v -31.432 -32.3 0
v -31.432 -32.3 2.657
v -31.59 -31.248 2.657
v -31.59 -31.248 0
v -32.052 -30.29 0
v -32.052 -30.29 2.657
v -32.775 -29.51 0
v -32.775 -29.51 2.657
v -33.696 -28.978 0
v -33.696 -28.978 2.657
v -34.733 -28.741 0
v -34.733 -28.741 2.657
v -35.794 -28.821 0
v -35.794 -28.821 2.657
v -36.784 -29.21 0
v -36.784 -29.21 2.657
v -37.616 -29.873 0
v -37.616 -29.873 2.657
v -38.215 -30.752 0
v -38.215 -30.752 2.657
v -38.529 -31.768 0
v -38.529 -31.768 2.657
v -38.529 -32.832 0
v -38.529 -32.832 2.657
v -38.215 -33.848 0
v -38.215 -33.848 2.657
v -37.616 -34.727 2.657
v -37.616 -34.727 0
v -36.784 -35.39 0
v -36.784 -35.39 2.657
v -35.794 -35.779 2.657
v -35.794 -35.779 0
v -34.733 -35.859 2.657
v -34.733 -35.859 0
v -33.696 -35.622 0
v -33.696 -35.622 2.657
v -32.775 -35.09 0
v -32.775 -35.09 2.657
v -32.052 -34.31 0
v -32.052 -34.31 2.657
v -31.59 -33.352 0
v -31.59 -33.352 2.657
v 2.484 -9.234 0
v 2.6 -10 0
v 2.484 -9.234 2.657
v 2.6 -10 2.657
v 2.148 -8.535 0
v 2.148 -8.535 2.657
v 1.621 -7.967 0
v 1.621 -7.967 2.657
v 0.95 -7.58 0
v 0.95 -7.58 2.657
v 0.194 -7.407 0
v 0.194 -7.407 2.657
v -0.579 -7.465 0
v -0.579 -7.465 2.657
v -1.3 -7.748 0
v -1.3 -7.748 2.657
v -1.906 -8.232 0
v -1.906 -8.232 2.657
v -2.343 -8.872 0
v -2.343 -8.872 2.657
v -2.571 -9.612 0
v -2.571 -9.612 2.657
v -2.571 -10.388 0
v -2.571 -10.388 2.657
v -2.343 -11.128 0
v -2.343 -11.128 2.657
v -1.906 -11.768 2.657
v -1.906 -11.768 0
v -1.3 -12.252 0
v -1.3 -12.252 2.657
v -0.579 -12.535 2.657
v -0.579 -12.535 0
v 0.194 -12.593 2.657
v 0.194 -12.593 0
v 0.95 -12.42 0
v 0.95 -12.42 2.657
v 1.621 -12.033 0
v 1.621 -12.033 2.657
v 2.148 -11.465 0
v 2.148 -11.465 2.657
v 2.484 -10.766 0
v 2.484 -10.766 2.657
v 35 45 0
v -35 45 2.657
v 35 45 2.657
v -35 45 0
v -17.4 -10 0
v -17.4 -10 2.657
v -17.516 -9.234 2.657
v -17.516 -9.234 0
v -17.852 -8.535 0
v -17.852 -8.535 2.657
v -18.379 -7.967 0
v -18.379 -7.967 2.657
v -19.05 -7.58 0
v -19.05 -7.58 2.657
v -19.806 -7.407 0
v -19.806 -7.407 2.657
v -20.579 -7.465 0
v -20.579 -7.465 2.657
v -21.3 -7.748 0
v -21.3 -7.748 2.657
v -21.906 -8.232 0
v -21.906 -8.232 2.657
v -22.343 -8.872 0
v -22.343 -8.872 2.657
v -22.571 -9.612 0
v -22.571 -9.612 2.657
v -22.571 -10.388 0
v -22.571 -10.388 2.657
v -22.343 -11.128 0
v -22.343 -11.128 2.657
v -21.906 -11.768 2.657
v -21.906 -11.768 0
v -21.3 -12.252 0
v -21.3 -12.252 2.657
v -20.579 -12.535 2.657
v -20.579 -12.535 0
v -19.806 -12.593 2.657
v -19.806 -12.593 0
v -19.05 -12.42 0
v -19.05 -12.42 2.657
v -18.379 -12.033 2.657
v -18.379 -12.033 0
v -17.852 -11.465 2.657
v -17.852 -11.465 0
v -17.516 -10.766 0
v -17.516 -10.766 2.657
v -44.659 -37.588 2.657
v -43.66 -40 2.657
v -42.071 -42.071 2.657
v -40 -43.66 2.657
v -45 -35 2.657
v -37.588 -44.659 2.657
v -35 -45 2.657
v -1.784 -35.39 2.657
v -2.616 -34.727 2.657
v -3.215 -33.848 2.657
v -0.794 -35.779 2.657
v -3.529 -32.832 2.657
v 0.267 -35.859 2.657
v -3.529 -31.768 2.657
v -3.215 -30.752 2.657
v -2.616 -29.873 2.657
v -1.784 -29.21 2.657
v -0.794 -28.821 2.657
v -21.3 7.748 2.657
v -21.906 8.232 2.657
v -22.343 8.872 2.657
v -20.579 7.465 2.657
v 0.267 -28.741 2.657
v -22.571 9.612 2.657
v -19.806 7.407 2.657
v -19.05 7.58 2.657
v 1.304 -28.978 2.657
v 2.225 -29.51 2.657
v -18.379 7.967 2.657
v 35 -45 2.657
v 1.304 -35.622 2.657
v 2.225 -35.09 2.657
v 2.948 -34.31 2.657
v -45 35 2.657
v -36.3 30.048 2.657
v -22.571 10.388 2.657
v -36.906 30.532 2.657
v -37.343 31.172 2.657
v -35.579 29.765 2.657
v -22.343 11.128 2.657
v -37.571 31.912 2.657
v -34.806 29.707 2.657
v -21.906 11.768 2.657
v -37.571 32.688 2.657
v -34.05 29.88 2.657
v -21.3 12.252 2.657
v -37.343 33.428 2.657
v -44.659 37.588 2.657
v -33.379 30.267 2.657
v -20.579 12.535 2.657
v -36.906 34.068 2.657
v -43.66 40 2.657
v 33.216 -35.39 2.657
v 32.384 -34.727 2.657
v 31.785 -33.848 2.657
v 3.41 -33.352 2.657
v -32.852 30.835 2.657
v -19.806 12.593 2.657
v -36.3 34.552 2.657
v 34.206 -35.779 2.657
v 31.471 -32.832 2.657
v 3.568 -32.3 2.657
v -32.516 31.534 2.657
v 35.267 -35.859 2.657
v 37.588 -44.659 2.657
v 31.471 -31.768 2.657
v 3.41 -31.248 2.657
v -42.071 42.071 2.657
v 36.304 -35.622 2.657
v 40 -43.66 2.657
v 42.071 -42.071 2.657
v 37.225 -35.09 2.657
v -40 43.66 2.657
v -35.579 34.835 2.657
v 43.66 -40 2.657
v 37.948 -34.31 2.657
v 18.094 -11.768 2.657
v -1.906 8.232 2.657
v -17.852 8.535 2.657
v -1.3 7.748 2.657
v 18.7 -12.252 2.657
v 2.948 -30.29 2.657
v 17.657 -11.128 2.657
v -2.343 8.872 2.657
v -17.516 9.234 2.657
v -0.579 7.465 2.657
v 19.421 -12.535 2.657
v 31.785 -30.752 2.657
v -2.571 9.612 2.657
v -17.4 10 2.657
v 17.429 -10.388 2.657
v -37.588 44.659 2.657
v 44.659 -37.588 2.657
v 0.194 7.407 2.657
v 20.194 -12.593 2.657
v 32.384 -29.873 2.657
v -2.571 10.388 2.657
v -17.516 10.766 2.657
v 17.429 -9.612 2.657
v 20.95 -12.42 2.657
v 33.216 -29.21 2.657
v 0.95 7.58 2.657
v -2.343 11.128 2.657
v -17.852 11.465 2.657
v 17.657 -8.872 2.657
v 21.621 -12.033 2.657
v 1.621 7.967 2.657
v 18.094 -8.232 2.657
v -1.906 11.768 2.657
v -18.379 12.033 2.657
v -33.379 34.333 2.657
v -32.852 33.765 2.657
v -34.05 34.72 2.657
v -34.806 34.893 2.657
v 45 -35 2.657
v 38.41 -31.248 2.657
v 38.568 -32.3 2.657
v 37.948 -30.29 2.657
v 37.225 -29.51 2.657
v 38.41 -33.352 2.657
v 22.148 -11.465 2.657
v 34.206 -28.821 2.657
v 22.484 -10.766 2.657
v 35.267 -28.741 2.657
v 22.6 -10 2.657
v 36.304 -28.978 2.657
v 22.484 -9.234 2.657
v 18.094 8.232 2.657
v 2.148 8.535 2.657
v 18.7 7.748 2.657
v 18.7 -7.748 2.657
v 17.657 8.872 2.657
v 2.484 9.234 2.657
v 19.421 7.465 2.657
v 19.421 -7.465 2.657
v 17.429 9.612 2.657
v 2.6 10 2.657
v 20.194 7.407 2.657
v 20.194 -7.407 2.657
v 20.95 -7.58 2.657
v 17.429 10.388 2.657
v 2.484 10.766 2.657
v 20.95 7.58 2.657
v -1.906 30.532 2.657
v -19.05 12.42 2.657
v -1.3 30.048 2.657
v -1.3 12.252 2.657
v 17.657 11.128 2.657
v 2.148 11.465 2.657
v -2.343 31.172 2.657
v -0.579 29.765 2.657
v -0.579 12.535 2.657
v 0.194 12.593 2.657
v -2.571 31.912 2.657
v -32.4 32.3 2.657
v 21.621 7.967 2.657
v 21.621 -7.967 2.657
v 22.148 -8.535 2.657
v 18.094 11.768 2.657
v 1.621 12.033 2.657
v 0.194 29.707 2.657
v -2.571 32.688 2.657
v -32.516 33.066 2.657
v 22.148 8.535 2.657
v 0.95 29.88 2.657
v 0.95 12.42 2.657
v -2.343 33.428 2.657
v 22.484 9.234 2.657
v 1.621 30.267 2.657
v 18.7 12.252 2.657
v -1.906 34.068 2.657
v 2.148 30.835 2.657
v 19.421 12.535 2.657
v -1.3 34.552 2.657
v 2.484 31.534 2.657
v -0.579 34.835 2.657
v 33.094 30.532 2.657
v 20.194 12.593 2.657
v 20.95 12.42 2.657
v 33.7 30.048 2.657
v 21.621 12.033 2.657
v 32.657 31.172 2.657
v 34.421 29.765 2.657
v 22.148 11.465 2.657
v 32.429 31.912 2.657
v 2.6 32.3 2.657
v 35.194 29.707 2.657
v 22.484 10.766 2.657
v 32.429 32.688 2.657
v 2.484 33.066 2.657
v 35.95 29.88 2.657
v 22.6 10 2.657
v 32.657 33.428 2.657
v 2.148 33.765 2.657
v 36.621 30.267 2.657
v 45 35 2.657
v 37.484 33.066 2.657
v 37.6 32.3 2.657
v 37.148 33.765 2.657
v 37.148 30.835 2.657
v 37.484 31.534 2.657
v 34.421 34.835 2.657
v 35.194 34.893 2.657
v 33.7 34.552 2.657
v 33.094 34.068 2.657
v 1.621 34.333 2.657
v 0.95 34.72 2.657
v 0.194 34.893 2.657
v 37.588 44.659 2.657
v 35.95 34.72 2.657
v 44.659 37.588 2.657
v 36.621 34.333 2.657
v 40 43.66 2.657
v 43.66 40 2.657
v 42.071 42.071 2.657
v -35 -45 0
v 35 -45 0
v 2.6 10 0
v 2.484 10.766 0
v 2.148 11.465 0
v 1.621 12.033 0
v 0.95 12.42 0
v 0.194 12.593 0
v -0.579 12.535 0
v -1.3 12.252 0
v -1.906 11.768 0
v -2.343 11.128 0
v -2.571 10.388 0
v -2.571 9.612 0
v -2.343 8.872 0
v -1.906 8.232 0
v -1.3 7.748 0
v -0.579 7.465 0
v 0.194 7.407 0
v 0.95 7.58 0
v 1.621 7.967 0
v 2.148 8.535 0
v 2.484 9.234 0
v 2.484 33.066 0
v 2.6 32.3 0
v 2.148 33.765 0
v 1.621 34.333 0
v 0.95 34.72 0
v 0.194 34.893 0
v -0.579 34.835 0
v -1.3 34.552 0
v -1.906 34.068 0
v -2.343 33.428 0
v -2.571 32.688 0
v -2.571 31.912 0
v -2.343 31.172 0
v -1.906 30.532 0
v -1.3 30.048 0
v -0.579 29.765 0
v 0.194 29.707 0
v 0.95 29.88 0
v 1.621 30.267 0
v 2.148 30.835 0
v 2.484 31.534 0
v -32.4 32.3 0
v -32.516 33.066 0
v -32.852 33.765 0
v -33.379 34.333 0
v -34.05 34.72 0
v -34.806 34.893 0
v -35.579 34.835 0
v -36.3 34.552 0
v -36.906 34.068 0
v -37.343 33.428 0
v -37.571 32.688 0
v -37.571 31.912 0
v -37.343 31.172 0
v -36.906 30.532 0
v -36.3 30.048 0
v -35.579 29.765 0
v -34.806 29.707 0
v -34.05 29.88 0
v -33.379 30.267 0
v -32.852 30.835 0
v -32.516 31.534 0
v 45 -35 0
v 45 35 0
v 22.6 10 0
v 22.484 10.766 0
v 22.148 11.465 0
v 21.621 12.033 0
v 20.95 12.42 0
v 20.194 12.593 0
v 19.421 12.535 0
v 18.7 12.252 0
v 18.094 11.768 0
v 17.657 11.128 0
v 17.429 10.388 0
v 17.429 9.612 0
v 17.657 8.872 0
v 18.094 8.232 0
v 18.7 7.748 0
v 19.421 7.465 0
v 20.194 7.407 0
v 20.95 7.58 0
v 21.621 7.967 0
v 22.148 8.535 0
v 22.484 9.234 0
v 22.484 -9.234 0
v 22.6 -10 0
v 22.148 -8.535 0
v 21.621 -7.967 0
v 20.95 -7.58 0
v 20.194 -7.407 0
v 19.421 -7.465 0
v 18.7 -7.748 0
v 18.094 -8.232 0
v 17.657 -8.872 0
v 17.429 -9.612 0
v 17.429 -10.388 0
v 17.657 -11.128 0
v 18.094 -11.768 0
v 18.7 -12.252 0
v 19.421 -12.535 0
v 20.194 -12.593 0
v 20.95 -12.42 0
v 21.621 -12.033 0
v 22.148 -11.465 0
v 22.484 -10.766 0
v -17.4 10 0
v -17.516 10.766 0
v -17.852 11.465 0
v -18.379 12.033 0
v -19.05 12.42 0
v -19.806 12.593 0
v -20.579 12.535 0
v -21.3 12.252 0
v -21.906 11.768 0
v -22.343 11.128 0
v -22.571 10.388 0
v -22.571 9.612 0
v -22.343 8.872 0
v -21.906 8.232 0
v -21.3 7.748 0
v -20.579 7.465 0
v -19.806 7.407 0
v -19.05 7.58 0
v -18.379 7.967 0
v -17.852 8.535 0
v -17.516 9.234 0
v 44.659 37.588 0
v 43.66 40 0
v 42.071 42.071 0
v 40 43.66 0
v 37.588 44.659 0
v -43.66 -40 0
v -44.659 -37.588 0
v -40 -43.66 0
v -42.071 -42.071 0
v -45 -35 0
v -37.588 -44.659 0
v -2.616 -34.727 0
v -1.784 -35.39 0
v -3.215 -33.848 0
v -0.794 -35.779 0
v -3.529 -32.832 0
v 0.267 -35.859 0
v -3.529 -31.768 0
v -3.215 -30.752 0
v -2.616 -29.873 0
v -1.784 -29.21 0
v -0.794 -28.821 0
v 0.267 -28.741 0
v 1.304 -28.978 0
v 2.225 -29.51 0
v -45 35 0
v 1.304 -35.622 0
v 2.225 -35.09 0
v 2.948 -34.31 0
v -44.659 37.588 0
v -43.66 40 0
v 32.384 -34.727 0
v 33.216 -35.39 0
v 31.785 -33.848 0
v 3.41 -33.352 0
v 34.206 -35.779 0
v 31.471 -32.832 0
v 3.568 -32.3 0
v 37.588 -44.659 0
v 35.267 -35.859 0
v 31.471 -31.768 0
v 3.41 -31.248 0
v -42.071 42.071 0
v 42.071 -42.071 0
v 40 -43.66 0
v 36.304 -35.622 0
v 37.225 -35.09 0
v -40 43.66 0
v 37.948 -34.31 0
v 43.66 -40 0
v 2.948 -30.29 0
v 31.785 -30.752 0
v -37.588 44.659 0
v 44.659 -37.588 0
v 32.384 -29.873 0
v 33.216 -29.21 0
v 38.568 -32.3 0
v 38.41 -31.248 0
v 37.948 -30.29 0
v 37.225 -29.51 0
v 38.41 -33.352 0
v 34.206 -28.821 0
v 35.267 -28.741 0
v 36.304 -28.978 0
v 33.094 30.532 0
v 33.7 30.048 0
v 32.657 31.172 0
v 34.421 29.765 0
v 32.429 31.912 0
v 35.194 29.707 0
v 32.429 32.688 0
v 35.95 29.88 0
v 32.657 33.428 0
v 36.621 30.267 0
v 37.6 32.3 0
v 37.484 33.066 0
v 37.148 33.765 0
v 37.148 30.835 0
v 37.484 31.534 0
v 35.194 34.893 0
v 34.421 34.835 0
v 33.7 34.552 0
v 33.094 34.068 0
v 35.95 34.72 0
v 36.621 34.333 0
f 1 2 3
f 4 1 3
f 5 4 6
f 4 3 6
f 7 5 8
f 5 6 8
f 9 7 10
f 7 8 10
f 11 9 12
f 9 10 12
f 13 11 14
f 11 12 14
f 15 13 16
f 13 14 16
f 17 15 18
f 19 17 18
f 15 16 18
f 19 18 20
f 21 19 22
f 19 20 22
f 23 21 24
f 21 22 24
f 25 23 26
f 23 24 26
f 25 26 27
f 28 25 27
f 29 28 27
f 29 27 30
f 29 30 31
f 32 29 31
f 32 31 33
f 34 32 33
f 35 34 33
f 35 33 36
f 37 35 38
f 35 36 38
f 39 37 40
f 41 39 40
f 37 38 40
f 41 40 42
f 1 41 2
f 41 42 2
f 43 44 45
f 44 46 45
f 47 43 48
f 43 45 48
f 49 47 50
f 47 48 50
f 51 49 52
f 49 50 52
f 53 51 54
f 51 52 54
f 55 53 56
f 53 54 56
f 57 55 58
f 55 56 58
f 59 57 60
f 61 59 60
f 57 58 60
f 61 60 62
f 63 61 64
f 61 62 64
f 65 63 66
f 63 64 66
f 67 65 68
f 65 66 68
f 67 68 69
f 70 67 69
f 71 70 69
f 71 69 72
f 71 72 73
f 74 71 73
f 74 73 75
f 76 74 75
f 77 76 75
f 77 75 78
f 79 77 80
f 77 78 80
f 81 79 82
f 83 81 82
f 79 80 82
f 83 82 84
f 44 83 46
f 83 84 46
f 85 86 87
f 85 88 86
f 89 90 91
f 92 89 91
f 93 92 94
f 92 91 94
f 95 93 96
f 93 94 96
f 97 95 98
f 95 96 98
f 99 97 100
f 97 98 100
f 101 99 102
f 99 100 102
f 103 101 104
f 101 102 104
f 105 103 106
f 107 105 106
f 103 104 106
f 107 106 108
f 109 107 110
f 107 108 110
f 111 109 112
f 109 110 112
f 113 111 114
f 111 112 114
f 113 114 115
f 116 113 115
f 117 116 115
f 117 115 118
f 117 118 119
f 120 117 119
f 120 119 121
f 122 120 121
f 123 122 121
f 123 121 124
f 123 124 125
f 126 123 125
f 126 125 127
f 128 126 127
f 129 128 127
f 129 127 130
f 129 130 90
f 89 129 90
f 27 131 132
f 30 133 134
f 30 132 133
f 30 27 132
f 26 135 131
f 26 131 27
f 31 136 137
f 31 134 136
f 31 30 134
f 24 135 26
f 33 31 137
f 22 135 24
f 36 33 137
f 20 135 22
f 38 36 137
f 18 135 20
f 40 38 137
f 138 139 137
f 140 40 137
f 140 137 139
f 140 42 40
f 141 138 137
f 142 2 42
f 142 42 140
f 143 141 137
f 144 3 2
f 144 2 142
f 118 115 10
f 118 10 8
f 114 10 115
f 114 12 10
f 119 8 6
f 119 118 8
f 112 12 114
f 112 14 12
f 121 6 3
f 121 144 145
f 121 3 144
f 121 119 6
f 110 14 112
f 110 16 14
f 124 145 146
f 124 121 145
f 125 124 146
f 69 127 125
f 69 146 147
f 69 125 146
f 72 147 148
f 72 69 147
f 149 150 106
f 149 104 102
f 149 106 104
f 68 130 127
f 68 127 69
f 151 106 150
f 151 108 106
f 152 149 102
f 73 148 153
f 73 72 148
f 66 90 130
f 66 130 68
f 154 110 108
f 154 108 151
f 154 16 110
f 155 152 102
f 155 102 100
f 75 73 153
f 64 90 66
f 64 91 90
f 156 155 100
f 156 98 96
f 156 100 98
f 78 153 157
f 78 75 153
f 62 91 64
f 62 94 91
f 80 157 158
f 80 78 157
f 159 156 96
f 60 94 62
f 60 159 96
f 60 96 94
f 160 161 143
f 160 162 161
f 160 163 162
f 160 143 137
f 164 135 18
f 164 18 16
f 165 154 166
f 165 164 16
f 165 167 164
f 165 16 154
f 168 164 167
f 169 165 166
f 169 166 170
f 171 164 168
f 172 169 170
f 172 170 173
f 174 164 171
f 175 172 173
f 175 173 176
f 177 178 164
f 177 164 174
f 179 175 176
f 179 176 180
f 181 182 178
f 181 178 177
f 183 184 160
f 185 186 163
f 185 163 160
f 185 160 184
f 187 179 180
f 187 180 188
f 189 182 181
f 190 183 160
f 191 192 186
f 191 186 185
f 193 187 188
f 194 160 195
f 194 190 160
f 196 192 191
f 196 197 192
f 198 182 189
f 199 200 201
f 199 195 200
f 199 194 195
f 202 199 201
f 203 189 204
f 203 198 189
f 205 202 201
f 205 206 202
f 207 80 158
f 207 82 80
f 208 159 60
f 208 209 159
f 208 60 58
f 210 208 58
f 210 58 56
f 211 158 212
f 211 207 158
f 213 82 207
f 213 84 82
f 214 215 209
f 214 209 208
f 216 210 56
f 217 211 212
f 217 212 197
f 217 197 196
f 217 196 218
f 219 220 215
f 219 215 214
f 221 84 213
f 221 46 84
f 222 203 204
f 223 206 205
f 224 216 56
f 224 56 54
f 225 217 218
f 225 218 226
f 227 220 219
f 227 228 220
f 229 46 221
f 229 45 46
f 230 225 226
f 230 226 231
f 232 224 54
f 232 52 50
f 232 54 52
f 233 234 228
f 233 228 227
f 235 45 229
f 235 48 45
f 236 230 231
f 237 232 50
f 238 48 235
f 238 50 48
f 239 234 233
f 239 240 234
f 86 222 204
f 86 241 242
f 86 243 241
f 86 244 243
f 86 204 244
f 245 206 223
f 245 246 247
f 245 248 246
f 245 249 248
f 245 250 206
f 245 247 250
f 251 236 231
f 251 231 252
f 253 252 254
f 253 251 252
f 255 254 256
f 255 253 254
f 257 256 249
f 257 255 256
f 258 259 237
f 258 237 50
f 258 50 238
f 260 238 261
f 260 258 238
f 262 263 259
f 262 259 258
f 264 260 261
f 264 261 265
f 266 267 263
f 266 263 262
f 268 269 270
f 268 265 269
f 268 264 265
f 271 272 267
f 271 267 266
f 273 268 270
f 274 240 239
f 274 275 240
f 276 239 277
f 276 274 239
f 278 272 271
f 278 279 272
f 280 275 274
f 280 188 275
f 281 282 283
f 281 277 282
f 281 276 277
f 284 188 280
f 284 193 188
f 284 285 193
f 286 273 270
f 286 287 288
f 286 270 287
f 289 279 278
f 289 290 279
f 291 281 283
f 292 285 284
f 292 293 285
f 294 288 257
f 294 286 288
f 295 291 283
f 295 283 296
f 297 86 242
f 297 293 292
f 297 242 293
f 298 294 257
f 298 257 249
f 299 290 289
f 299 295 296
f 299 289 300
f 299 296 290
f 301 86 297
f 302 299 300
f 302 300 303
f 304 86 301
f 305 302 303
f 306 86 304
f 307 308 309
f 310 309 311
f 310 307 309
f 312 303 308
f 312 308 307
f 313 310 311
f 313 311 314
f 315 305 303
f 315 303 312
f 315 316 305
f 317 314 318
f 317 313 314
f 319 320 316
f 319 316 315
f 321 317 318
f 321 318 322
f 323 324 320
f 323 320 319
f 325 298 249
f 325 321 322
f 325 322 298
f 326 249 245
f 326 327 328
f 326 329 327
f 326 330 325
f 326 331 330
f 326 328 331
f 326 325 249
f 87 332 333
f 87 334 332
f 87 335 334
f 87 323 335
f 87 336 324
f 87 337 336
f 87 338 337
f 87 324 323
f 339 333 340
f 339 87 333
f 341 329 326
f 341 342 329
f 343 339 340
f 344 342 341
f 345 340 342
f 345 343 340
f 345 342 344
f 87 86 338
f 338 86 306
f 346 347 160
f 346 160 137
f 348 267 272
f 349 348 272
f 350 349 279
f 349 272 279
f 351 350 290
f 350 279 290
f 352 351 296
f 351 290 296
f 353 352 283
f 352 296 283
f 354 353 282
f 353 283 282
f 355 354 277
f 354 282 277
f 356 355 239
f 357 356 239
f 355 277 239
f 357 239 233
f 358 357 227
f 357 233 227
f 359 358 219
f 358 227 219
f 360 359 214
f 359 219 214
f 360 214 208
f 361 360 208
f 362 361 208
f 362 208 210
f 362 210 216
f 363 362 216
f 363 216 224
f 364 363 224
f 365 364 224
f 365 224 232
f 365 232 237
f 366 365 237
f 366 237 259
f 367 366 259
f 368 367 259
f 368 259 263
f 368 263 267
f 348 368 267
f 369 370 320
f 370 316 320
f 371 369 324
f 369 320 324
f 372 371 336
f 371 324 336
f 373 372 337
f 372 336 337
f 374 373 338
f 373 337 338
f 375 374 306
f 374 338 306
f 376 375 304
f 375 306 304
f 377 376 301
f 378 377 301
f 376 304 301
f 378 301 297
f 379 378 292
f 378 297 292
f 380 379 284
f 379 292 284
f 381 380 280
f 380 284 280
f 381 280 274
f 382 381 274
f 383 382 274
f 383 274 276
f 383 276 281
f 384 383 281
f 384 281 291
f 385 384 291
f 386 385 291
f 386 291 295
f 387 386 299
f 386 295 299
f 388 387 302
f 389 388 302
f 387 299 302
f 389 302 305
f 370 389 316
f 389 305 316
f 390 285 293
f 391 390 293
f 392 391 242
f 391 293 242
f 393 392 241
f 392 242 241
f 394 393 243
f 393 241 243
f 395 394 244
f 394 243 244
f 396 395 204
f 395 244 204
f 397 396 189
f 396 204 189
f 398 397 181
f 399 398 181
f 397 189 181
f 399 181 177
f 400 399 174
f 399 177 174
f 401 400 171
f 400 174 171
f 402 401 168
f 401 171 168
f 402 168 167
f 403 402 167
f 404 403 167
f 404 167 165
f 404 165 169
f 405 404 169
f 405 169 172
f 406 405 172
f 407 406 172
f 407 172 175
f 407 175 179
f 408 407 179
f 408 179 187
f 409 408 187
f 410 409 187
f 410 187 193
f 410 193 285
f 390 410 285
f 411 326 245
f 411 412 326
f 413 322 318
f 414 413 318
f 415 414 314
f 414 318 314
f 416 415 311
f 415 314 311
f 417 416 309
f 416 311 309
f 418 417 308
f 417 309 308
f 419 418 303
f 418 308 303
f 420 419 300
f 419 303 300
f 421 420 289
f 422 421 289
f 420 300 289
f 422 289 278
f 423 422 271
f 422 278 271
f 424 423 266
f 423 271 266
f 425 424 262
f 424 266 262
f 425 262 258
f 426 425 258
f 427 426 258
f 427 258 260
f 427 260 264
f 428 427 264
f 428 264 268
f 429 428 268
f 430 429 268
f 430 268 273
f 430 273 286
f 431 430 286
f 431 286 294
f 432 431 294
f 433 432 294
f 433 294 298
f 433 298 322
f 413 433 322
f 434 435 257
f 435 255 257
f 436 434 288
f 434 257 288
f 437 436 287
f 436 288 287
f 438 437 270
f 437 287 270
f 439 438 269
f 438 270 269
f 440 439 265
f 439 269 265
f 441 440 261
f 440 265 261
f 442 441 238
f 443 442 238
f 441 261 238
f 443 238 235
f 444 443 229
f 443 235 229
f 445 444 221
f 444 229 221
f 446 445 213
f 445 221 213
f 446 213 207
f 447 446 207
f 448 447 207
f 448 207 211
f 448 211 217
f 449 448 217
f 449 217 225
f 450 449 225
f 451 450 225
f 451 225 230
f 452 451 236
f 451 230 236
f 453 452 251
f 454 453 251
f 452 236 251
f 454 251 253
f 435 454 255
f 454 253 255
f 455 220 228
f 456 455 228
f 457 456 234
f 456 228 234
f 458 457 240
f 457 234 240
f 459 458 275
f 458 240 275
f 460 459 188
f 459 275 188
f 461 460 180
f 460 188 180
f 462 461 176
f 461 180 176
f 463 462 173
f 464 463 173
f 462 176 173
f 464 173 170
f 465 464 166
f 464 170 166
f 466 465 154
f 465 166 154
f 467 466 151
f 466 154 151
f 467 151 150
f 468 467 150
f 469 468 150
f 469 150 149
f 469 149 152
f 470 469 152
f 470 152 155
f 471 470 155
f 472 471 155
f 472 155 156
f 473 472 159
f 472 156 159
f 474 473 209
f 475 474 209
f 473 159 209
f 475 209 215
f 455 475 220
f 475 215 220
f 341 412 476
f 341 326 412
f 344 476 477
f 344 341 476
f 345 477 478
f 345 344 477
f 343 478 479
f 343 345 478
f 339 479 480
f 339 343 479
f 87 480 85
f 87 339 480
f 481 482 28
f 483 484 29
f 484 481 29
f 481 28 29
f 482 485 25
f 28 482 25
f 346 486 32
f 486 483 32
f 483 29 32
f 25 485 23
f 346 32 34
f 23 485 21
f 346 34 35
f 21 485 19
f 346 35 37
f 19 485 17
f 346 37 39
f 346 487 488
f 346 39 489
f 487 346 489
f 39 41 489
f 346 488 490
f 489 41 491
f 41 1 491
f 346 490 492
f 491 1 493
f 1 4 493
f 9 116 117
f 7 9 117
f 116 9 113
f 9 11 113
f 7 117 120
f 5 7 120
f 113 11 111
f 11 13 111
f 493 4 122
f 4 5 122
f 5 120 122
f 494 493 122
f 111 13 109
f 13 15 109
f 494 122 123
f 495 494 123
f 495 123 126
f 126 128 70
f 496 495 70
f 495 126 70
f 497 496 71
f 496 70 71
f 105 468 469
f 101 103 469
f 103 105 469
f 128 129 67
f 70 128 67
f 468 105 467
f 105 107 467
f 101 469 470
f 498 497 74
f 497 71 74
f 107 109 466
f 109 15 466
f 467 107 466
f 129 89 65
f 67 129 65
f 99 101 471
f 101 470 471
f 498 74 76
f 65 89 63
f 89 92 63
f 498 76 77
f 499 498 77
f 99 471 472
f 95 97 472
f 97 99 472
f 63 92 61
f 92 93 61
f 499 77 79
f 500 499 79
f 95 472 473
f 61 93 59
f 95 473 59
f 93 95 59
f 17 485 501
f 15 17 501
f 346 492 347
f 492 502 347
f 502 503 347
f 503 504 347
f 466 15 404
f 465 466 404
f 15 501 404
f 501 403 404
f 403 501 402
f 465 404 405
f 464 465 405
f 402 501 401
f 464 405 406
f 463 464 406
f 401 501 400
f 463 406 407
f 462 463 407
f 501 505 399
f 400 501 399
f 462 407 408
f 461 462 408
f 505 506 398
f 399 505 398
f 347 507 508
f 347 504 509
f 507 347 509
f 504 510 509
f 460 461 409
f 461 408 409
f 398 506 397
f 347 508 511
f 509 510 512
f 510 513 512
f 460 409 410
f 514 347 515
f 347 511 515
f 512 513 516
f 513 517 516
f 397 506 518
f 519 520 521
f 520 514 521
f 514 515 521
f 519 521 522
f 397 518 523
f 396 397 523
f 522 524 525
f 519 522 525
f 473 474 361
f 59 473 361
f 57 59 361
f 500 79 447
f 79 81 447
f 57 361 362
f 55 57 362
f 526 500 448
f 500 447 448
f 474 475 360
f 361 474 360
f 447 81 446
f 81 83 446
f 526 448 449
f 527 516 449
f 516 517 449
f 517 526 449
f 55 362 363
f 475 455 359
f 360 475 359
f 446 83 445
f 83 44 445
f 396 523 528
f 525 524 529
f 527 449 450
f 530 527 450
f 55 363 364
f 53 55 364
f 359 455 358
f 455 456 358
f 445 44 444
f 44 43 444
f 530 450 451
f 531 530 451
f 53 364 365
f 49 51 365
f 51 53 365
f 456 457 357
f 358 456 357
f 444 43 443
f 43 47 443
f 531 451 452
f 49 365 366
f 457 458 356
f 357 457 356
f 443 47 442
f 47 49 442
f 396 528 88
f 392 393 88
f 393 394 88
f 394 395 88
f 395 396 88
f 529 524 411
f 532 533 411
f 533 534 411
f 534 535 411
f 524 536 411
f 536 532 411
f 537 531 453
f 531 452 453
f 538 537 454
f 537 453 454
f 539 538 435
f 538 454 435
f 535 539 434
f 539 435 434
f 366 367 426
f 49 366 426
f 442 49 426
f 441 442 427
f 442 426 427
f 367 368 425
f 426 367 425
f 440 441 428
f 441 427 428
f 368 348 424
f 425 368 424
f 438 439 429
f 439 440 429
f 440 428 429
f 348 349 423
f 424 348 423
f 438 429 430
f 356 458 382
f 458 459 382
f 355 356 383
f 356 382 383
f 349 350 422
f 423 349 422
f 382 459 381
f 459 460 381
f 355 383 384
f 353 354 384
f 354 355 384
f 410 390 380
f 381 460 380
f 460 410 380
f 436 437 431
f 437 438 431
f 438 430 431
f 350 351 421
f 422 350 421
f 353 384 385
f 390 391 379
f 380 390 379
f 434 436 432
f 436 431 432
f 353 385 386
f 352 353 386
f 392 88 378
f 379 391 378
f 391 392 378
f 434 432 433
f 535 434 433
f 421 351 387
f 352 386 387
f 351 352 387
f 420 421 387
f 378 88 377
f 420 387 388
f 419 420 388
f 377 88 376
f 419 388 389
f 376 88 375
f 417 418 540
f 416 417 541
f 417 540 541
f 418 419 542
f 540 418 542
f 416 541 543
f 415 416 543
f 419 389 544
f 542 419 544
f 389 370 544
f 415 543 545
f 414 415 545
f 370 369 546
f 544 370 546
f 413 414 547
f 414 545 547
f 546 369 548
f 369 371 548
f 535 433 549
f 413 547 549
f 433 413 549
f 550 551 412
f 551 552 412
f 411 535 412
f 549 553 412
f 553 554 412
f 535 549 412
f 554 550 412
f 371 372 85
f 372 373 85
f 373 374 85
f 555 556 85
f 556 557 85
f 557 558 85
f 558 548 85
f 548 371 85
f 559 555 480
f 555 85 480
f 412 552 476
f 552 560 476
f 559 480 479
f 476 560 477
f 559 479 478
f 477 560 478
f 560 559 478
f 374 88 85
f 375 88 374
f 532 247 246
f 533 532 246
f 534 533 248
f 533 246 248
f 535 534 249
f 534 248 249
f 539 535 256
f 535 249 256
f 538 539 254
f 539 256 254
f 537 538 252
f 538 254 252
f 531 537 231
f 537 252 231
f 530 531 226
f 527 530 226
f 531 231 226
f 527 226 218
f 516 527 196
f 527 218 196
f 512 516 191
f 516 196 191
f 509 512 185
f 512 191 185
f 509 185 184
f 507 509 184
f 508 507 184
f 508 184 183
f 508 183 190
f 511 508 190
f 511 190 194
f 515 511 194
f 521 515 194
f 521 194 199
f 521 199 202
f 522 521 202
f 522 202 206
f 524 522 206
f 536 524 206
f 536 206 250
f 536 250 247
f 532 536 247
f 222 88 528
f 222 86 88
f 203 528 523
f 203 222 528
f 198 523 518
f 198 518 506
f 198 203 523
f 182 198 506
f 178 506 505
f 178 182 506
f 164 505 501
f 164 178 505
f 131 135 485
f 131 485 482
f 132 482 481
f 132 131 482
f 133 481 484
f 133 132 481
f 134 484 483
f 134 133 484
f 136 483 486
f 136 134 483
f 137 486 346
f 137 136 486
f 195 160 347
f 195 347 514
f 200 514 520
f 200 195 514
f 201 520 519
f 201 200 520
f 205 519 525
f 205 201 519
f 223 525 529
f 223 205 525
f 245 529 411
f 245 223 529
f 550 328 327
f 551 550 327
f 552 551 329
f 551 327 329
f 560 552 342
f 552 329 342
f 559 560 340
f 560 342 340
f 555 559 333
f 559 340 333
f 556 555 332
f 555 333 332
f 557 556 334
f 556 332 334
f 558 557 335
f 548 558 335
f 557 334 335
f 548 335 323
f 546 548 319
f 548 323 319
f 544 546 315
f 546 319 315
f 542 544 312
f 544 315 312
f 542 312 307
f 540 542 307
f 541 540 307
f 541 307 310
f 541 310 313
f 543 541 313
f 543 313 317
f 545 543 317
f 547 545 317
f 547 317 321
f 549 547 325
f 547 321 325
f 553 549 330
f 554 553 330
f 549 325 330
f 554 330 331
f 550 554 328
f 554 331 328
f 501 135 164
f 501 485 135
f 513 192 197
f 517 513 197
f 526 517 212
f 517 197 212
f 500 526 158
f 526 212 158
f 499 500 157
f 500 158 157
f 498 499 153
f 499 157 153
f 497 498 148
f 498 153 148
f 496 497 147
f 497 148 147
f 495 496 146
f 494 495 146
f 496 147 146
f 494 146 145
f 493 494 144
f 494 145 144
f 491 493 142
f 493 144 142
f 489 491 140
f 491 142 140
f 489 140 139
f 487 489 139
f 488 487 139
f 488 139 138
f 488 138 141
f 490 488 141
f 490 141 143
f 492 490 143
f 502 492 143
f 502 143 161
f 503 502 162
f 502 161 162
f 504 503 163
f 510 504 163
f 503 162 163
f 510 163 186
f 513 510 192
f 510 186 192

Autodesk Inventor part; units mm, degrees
ref_plane "YZ Plane" through (0, 0, 0) normal (1, 0, 0) x (0, 1, 0)
ref_plane "XZ Plane" through (0, 0, 0) normal (0, 1, 0) x (-1, 0, 0)
ref_plane "XY Plane" through (0, 0, 0) normal (0, 0, 1) x (1, 0, 0)
sketch "Sketch1" plane through (0, 0, 0) normal (0, 0, 1) x (1, 0, 0)
  line L0 (-45, 45) -> (45, 45)
  line L1 (45, 45) -> (45, -45)
  line L2 (45, -45) -> (-45, -45)
  line L3 (-45, -45) -> (-45, 45)
  point P0 (0, 0)
  dimension "d0" = 90
  dimension "d1" = 90
  dimension "d2" = 45
  dimension "d3" = 45
extrude "Extrusion1" add sketch "Sketch1" along normal blind 2.6568
fillet "Fillet1" radius 10 4 edges at (45, 45, 1.3284) (-45, 45, 1.3284) (45, -45, 1.3284) (-45, -45, 1.3284)
sketch "Sketch2" plane through (0, 0, 2.6568) normal (0, 0, 1) x (1, 0, 0)
  line L0 (45, 35) -> (45, -35) projected
  line L1 (-35, 45) -> (35, 45) projected
  circle A0 centre (35, 32.3) radius 2.6
  circle A1 centre (35, -32.3) radius 3.5685
  point P0 (0, 0)
  dimension "d7" = 5.2
  dimension "d8" = 10
  dimension "d10" = 7.137
  dimension "d12" = 10
  dimension "d52" = 64.6
  dimension "d53" = 12.7
extrude "Extrusion2" cut sketch "Sketch2" against normal through all
pattern_linear "Rectangular Pattern1" count 3 spacing 35 along (-1, 0, 0) of "Extrusion2"
sketch "Sketch3" plane through (0, 0, 2.6568) normal (0, 0, 1) x (1, 0, 0)
  line L0 (35, -45) -> (-35, -45) projected
  line L1 (-45, -35) -> (-45, 35) projected
  circle A0 centre (-20, -10) radius 2.6
  point P0 (0, 0)
  dimension "d18" = 5.2
  dimension "d19" = 25
  dimension "d20" = 35
extrude "Extrusion3" cut sketch "Sketch3" against normal through all
pattern_linear "Rectangular Pattern2" count 3 spacing 20 along (1, 0, 0) count 2 spacing 20 along (0, 1, 0) of "Extrusion3"
equation "\"d2\" = 0.5 * d0"
equation "\"d3\" = 0.5 * d1"
properties part number "spindle_mount_plate" material "Steel, Mild"
